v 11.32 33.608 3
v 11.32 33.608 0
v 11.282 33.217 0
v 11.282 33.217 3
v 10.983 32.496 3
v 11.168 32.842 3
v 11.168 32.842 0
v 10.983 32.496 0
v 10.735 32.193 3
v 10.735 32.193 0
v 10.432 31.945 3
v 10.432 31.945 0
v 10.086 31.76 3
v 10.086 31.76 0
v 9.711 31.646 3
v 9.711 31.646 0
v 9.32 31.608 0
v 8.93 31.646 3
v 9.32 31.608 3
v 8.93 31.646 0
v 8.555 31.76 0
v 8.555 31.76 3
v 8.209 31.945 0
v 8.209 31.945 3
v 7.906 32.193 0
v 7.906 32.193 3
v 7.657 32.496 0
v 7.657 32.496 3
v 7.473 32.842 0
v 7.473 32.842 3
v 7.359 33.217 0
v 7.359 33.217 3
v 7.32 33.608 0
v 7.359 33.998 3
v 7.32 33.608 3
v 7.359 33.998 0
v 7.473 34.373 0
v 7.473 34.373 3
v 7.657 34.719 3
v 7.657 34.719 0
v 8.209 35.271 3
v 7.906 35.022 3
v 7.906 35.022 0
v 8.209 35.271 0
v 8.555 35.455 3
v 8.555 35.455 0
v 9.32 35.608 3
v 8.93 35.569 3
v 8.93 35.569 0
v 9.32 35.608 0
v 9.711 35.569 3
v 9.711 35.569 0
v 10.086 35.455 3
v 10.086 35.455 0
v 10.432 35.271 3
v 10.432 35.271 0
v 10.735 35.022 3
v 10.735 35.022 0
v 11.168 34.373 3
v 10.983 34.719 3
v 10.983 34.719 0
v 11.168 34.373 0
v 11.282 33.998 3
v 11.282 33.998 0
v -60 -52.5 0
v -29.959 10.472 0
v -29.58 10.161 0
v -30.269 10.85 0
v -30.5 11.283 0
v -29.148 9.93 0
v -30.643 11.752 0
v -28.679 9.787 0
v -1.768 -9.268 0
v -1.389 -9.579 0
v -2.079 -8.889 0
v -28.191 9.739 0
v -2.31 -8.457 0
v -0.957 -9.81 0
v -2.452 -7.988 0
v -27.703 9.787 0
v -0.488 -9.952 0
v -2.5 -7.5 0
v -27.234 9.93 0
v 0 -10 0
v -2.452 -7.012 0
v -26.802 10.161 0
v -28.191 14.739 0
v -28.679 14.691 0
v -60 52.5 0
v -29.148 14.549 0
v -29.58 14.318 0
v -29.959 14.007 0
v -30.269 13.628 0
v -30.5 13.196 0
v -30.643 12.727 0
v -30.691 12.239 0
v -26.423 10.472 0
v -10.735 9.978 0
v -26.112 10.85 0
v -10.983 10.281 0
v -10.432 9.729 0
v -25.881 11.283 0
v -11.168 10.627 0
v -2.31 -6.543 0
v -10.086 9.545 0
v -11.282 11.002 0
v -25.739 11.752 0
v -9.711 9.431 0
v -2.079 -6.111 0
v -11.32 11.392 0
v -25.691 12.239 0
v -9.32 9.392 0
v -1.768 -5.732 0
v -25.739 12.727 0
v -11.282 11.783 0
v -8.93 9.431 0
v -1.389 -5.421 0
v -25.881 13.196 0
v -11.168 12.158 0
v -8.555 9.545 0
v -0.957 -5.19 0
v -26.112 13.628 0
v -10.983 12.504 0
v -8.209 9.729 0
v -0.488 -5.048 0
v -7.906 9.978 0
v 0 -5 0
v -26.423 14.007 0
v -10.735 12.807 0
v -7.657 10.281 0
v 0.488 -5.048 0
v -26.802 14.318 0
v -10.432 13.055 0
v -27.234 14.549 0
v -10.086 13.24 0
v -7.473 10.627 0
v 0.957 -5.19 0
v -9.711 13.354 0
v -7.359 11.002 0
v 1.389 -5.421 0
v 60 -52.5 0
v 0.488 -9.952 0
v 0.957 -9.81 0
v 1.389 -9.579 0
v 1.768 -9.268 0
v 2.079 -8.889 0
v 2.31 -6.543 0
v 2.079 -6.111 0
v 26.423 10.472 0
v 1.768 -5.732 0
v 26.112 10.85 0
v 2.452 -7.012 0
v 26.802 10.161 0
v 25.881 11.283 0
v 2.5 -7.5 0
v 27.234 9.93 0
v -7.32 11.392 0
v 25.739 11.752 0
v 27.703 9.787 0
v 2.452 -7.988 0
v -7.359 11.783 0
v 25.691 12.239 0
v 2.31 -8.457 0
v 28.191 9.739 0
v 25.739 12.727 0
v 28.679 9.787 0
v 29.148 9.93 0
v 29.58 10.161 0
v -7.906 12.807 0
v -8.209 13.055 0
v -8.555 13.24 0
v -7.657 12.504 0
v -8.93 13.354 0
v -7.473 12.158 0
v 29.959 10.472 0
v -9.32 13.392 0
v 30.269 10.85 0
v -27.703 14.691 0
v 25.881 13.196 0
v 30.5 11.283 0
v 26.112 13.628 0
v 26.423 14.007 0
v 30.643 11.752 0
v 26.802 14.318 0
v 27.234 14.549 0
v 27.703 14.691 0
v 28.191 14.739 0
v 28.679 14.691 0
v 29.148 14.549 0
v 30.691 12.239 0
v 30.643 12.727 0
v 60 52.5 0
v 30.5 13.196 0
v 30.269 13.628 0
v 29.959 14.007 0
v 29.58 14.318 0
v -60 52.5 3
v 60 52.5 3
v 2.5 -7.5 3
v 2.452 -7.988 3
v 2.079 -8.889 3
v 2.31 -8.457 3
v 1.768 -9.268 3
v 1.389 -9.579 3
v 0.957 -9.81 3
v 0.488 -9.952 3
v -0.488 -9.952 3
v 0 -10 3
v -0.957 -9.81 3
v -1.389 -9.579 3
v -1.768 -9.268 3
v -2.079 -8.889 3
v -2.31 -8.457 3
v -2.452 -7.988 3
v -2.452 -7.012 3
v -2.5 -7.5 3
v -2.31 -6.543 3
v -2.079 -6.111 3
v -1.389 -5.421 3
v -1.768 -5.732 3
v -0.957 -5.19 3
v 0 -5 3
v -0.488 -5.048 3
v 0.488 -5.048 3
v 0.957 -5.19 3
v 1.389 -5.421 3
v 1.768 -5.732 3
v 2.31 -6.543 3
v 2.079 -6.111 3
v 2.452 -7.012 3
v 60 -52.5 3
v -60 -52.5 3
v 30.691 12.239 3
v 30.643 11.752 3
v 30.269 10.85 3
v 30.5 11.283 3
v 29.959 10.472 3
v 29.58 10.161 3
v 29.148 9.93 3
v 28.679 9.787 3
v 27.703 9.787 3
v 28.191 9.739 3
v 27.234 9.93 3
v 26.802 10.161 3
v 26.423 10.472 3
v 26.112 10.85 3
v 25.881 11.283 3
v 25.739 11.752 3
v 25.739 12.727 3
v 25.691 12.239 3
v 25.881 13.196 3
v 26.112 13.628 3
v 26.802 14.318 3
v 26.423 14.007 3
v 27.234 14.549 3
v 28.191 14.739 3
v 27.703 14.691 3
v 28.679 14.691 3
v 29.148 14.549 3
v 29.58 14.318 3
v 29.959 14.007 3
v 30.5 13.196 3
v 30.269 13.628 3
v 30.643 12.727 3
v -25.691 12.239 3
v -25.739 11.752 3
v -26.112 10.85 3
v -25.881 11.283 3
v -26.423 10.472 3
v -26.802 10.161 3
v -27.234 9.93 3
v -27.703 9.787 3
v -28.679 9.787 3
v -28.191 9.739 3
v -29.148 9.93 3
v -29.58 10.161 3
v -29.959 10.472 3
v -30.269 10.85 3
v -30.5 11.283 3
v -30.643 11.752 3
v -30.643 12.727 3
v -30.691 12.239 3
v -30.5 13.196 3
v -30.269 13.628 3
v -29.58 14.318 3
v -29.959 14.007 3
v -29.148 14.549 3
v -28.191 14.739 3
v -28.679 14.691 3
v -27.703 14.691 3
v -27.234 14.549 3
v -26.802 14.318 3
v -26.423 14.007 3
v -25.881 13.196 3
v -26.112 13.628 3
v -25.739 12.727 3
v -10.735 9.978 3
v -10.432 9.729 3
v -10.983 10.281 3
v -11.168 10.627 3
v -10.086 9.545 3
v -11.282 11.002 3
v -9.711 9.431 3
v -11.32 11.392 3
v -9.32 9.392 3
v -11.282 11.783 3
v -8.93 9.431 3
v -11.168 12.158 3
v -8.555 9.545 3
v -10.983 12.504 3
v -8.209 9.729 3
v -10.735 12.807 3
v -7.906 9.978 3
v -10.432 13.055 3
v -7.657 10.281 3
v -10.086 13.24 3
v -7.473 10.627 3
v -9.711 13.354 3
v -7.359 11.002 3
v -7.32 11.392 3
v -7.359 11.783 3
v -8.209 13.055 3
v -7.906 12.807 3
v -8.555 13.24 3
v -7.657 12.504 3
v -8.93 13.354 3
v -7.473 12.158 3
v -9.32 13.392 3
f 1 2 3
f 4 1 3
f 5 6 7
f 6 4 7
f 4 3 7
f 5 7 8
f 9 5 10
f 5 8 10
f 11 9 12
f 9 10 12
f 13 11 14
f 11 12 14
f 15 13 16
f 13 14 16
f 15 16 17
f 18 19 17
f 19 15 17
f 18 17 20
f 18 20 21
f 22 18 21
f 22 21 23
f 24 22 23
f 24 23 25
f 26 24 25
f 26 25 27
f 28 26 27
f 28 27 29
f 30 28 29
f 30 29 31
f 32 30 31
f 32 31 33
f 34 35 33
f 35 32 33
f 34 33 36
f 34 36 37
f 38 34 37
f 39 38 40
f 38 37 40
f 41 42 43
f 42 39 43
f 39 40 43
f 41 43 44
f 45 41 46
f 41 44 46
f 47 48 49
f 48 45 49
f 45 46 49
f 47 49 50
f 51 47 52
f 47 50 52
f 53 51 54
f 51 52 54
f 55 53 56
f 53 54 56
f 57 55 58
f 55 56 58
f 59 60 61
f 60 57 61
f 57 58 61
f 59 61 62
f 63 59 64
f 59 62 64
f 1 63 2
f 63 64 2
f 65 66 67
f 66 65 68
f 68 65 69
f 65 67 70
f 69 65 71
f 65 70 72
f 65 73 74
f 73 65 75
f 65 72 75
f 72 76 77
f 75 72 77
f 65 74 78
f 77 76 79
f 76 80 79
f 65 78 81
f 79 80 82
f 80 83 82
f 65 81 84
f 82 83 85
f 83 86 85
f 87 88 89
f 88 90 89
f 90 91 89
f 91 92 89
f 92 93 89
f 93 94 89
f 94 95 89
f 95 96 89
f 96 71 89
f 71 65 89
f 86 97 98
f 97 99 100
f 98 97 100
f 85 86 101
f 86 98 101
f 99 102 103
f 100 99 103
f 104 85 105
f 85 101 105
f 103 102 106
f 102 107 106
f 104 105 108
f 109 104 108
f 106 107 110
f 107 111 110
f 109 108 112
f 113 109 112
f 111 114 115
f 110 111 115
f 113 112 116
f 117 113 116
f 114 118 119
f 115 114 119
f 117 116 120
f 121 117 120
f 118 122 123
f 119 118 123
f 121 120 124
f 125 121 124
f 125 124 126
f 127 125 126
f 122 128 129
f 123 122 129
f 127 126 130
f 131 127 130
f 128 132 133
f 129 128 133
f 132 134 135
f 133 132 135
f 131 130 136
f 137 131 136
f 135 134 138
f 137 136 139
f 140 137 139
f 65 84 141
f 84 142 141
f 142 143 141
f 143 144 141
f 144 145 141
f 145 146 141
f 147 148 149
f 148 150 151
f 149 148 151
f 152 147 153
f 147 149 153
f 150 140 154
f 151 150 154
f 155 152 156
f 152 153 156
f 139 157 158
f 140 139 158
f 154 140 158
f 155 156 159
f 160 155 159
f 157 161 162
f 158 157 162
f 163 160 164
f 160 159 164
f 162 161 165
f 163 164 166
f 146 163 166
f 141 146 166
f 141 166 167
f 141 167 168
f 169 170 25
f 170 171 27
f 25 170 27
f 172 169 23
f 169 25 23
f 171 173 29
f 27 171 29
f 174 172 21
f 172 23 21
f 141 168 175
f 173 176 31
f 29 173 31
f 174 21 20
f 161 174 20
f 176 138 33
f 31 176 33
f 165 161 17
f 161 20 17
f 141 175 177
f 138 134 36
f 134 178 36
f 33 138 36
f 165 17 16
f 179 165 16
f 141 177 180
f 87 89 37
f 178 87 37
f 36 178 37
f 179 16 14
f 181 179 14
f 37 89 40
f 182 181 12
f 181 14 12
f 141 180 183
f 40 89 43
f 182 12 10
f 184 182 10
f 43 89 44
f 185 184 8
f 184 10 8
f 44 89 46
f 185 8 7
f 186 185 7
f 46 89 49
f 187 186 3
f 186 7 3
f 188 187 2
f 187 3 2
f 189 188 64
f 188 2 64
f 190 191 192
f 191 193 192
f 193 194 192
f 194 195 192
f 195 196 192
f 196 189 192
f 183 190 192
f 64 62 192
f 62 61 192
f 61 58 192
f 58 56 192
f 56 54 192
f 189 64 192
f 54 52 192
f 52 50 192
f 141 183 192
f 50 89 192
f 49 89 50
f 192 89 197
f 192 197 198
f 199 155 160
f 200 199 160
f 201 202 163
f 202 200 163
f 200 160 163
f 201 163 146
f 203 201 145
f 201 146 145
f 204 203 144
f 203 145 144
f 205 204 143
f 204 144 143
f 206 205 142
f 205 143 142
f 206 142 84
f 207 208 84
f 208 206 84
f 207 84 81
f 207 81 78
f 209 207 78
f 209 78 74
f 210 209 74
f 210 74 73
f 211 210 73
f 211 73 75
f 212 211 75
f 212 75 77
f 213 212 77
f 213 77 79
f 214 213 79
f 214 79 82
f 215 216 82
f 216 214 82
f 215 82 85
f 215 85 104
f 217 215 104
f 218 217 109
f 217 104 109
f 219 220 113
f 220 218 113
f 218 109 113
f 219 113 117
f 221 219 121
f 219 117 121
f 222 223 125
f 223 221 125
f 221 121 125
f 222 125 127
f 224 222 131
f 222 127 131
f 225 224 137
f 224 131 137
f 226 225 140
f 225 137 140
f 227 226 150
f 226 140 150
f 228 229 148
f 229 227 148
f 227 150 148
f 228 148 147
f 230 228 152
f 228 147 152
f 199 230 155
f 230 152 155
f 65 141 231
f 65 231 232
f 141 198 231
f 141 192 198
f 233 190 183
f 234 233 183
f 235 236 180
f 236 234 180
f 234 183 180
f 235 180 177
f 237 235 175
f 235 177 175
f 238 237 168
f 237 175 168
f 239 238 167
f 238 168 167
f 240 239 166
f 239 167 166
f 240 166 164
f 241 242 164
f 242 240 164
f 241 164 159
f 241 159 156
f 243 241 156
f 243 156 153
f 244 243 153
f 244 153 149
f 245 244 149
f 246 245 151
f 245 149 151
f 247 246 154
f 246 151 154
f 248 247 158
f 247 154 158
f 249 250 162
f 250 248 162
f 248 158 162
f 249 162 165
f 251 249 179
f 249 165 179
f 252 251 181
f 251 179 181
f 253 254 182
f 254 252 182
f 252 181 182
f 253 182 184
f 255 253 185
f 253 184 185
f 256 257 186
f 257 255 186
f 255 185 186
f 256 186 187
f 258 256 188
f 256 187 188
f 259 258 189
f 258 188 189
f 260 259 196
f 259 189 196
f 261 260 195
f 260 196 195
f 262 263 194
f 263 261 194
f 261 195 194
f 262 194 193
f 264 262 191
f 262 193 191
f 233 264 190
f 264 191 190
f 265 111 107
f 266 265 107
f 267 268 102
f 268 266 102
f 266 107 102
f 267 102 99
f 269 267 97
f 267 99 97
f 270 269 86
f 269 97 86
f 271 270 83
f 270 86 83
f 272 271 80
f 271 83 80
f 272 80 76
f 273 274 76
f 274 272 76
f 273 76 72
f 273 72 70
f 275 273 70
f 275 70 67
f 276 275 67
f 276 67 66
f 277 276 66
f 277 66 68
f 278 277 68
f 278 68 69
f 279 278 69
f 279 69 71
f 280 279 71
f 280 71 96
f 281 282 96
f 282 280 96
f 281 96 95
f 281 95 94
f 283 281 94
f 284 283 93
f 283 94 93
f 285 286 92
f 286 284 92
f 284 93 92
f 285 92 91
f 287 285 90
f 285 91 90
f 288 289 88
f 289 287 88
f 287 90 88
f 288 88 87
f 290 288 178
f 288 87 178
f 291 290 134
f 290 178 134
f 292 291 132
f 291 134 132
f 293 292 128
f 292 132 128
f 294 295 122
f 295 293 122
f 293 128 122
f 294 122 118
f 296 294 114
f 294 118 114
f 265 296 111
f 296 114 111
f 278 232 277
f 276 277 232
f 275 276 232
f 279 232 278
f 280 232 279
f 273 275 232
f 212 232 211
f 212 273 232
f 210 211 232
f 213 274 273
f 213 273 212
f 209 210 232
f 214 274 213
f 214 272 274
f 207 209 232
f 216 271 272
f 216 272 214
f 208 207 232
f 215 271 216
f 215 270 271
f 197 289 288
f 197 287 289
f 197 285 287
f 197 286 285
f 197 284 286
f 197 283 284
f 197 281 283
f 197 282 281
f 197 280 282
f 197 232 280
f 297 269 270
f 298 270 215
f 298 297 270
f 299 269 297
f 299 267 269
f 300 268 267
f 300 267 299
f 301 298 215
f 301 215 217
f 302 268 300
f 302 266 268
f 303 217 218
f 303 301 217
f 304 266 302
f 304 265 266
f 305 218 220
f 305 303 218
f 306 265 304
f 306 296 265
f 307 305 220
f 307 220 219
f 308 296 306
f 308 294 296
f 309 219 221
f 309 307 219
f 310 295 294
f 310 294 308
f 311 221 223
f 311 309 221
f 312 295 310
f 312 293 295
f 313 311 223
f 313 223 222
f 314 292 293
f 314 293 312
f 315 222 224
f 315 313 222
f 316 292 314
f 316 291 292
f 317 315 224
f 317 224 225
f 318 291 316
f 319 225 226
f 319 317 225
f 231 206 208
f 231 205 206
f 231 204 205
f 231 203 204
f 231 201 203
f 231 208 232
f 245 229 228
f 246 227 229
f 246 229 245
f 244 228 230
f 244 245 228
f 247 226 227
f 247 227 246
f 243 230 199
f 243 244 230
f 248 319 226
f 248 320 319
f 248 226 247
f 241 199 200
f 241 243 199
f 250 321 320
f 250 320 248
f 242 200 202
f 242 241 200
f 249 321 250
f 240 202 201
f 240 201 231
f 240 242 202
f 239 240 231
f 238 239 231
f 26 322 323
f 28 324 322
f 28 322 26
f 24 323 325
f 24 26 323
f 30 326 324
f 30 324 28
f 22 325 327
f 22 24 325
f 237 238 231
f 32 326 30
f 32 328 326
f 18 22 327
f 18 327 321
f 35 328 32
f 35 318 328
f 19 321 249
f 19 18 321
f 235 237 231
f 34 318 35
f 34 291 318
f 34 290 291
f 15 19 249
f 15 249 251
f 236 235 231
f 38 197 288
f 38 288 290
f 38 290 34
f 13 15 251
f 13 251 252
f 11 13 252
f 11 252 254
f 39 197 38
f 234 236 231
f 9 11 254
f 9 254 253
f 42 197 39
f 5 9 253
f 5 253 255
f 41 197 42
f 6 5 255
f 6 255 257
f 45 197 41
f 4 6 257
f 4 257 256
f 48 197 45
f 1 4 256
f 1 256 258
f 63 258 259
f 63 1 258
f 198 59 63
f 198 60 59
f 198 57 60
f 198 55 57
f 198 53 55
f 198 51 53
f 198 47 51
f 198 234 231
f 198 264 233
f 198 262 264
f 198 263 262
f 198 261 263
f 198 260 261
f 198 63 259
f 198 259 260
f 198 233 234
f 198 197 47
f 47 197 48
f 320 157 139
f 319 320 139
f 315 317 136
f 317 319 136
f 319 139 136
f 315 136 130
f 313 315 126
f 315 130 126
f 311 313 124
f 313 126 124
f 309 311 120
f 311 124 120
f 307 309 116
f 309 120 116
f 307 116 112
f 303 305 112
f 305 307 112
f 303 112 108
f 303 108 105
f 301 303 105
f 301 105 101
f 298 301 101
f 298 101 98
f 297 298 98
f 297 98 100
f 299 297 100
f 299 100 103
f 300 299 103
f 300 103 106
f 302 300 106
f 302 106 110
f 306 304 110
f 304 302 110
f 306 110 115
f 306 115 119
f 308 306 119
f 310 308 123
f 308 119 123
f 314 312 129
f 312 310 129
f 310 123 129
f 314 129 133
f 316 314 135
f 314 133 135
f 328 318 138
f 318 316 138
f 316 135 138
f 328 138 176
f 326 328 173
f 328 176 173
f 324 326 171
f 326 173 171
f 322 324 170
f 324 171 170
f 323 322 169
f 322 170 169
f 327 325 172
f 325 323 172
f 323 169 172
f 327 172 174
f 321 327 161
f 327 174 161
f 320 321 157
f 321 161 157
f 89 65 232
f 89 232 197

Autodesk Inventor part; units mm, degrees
ref_plane "YZ Plane" through (0, 0, 0) normal (1, 0, 0) x (0, 1, 0)
ref_plane "XZ Plane" through (0, 0, 0) normal (0, 1, 0) x (-1, 0, 0)
ref_plane "XY Plane" through (0, 0, 0) normal (0, 0, 1) x (1, 0, 0)
sketch "スケッチ1" plane through (0, 0, 0) normal (0, 0, 1) x (1, 0, 0)
  line L0 (-60, 52.5) -> (60, 52.5)
  line L1 (60, 52.5) -> (60, -52.5)
  line L2 (60, -52.5) -> (-60, -52.5)
  line L3 (-60, -52.5) -> (-60, 52.5)
  line L4 (-60, 52.5) -> (60, -52.5) construction
  line L5 (60, 52.5) -> (-60, -52.5) construction
  line L6 (-105.2334, 22.5) -> (96.2645, 22.5) construction
  circle A0 centre (0, -7.5) radius 2.5
  line L7 (0, 22.5) -> (28.1908, 12.2394) construction
  line L8 (0, 22.5) -> (-28.1908, 12.2394) construction
  line L9 (-9.3204, 11.3924) -> (0, 22.5) construction
  line L10 (9.3204, 33.6076) -> (0, 22.5) construction
  line L11 (0, 85.1475) -> (0, -17.897) construction
  circle A1 centre (-9.3204, 11.3924) radius 2
  circle A2 centre (9.3204, 33.6076) radius 2
  circle A3 centre (28.1908, 12.2394) radius 2.5
  circle A4 centre (-28.1908, 12.2394) radius 2.5
  point P0 (0, 0)
  dimension "d1" = 105
  dimension "d2" = 30
  dimension "d3" = 5
  dimension "d4" = 30
  dimension "d5" = 20
  dimension "d6" = 20
  dimension "d7" = 40
  dimension "d12" = 30
  dimension "d13" = 30
  dimension "d14" = 14.5
  dimension "d15" = 14.5
  dimension "d16" = 4
  dimension "d17" = 4
  dimension "d18" = 5
  dimension "d19" = 5
extrude "押し出し1" add sketch "スケッチ1" along normal blind 3
properties part number "板"
